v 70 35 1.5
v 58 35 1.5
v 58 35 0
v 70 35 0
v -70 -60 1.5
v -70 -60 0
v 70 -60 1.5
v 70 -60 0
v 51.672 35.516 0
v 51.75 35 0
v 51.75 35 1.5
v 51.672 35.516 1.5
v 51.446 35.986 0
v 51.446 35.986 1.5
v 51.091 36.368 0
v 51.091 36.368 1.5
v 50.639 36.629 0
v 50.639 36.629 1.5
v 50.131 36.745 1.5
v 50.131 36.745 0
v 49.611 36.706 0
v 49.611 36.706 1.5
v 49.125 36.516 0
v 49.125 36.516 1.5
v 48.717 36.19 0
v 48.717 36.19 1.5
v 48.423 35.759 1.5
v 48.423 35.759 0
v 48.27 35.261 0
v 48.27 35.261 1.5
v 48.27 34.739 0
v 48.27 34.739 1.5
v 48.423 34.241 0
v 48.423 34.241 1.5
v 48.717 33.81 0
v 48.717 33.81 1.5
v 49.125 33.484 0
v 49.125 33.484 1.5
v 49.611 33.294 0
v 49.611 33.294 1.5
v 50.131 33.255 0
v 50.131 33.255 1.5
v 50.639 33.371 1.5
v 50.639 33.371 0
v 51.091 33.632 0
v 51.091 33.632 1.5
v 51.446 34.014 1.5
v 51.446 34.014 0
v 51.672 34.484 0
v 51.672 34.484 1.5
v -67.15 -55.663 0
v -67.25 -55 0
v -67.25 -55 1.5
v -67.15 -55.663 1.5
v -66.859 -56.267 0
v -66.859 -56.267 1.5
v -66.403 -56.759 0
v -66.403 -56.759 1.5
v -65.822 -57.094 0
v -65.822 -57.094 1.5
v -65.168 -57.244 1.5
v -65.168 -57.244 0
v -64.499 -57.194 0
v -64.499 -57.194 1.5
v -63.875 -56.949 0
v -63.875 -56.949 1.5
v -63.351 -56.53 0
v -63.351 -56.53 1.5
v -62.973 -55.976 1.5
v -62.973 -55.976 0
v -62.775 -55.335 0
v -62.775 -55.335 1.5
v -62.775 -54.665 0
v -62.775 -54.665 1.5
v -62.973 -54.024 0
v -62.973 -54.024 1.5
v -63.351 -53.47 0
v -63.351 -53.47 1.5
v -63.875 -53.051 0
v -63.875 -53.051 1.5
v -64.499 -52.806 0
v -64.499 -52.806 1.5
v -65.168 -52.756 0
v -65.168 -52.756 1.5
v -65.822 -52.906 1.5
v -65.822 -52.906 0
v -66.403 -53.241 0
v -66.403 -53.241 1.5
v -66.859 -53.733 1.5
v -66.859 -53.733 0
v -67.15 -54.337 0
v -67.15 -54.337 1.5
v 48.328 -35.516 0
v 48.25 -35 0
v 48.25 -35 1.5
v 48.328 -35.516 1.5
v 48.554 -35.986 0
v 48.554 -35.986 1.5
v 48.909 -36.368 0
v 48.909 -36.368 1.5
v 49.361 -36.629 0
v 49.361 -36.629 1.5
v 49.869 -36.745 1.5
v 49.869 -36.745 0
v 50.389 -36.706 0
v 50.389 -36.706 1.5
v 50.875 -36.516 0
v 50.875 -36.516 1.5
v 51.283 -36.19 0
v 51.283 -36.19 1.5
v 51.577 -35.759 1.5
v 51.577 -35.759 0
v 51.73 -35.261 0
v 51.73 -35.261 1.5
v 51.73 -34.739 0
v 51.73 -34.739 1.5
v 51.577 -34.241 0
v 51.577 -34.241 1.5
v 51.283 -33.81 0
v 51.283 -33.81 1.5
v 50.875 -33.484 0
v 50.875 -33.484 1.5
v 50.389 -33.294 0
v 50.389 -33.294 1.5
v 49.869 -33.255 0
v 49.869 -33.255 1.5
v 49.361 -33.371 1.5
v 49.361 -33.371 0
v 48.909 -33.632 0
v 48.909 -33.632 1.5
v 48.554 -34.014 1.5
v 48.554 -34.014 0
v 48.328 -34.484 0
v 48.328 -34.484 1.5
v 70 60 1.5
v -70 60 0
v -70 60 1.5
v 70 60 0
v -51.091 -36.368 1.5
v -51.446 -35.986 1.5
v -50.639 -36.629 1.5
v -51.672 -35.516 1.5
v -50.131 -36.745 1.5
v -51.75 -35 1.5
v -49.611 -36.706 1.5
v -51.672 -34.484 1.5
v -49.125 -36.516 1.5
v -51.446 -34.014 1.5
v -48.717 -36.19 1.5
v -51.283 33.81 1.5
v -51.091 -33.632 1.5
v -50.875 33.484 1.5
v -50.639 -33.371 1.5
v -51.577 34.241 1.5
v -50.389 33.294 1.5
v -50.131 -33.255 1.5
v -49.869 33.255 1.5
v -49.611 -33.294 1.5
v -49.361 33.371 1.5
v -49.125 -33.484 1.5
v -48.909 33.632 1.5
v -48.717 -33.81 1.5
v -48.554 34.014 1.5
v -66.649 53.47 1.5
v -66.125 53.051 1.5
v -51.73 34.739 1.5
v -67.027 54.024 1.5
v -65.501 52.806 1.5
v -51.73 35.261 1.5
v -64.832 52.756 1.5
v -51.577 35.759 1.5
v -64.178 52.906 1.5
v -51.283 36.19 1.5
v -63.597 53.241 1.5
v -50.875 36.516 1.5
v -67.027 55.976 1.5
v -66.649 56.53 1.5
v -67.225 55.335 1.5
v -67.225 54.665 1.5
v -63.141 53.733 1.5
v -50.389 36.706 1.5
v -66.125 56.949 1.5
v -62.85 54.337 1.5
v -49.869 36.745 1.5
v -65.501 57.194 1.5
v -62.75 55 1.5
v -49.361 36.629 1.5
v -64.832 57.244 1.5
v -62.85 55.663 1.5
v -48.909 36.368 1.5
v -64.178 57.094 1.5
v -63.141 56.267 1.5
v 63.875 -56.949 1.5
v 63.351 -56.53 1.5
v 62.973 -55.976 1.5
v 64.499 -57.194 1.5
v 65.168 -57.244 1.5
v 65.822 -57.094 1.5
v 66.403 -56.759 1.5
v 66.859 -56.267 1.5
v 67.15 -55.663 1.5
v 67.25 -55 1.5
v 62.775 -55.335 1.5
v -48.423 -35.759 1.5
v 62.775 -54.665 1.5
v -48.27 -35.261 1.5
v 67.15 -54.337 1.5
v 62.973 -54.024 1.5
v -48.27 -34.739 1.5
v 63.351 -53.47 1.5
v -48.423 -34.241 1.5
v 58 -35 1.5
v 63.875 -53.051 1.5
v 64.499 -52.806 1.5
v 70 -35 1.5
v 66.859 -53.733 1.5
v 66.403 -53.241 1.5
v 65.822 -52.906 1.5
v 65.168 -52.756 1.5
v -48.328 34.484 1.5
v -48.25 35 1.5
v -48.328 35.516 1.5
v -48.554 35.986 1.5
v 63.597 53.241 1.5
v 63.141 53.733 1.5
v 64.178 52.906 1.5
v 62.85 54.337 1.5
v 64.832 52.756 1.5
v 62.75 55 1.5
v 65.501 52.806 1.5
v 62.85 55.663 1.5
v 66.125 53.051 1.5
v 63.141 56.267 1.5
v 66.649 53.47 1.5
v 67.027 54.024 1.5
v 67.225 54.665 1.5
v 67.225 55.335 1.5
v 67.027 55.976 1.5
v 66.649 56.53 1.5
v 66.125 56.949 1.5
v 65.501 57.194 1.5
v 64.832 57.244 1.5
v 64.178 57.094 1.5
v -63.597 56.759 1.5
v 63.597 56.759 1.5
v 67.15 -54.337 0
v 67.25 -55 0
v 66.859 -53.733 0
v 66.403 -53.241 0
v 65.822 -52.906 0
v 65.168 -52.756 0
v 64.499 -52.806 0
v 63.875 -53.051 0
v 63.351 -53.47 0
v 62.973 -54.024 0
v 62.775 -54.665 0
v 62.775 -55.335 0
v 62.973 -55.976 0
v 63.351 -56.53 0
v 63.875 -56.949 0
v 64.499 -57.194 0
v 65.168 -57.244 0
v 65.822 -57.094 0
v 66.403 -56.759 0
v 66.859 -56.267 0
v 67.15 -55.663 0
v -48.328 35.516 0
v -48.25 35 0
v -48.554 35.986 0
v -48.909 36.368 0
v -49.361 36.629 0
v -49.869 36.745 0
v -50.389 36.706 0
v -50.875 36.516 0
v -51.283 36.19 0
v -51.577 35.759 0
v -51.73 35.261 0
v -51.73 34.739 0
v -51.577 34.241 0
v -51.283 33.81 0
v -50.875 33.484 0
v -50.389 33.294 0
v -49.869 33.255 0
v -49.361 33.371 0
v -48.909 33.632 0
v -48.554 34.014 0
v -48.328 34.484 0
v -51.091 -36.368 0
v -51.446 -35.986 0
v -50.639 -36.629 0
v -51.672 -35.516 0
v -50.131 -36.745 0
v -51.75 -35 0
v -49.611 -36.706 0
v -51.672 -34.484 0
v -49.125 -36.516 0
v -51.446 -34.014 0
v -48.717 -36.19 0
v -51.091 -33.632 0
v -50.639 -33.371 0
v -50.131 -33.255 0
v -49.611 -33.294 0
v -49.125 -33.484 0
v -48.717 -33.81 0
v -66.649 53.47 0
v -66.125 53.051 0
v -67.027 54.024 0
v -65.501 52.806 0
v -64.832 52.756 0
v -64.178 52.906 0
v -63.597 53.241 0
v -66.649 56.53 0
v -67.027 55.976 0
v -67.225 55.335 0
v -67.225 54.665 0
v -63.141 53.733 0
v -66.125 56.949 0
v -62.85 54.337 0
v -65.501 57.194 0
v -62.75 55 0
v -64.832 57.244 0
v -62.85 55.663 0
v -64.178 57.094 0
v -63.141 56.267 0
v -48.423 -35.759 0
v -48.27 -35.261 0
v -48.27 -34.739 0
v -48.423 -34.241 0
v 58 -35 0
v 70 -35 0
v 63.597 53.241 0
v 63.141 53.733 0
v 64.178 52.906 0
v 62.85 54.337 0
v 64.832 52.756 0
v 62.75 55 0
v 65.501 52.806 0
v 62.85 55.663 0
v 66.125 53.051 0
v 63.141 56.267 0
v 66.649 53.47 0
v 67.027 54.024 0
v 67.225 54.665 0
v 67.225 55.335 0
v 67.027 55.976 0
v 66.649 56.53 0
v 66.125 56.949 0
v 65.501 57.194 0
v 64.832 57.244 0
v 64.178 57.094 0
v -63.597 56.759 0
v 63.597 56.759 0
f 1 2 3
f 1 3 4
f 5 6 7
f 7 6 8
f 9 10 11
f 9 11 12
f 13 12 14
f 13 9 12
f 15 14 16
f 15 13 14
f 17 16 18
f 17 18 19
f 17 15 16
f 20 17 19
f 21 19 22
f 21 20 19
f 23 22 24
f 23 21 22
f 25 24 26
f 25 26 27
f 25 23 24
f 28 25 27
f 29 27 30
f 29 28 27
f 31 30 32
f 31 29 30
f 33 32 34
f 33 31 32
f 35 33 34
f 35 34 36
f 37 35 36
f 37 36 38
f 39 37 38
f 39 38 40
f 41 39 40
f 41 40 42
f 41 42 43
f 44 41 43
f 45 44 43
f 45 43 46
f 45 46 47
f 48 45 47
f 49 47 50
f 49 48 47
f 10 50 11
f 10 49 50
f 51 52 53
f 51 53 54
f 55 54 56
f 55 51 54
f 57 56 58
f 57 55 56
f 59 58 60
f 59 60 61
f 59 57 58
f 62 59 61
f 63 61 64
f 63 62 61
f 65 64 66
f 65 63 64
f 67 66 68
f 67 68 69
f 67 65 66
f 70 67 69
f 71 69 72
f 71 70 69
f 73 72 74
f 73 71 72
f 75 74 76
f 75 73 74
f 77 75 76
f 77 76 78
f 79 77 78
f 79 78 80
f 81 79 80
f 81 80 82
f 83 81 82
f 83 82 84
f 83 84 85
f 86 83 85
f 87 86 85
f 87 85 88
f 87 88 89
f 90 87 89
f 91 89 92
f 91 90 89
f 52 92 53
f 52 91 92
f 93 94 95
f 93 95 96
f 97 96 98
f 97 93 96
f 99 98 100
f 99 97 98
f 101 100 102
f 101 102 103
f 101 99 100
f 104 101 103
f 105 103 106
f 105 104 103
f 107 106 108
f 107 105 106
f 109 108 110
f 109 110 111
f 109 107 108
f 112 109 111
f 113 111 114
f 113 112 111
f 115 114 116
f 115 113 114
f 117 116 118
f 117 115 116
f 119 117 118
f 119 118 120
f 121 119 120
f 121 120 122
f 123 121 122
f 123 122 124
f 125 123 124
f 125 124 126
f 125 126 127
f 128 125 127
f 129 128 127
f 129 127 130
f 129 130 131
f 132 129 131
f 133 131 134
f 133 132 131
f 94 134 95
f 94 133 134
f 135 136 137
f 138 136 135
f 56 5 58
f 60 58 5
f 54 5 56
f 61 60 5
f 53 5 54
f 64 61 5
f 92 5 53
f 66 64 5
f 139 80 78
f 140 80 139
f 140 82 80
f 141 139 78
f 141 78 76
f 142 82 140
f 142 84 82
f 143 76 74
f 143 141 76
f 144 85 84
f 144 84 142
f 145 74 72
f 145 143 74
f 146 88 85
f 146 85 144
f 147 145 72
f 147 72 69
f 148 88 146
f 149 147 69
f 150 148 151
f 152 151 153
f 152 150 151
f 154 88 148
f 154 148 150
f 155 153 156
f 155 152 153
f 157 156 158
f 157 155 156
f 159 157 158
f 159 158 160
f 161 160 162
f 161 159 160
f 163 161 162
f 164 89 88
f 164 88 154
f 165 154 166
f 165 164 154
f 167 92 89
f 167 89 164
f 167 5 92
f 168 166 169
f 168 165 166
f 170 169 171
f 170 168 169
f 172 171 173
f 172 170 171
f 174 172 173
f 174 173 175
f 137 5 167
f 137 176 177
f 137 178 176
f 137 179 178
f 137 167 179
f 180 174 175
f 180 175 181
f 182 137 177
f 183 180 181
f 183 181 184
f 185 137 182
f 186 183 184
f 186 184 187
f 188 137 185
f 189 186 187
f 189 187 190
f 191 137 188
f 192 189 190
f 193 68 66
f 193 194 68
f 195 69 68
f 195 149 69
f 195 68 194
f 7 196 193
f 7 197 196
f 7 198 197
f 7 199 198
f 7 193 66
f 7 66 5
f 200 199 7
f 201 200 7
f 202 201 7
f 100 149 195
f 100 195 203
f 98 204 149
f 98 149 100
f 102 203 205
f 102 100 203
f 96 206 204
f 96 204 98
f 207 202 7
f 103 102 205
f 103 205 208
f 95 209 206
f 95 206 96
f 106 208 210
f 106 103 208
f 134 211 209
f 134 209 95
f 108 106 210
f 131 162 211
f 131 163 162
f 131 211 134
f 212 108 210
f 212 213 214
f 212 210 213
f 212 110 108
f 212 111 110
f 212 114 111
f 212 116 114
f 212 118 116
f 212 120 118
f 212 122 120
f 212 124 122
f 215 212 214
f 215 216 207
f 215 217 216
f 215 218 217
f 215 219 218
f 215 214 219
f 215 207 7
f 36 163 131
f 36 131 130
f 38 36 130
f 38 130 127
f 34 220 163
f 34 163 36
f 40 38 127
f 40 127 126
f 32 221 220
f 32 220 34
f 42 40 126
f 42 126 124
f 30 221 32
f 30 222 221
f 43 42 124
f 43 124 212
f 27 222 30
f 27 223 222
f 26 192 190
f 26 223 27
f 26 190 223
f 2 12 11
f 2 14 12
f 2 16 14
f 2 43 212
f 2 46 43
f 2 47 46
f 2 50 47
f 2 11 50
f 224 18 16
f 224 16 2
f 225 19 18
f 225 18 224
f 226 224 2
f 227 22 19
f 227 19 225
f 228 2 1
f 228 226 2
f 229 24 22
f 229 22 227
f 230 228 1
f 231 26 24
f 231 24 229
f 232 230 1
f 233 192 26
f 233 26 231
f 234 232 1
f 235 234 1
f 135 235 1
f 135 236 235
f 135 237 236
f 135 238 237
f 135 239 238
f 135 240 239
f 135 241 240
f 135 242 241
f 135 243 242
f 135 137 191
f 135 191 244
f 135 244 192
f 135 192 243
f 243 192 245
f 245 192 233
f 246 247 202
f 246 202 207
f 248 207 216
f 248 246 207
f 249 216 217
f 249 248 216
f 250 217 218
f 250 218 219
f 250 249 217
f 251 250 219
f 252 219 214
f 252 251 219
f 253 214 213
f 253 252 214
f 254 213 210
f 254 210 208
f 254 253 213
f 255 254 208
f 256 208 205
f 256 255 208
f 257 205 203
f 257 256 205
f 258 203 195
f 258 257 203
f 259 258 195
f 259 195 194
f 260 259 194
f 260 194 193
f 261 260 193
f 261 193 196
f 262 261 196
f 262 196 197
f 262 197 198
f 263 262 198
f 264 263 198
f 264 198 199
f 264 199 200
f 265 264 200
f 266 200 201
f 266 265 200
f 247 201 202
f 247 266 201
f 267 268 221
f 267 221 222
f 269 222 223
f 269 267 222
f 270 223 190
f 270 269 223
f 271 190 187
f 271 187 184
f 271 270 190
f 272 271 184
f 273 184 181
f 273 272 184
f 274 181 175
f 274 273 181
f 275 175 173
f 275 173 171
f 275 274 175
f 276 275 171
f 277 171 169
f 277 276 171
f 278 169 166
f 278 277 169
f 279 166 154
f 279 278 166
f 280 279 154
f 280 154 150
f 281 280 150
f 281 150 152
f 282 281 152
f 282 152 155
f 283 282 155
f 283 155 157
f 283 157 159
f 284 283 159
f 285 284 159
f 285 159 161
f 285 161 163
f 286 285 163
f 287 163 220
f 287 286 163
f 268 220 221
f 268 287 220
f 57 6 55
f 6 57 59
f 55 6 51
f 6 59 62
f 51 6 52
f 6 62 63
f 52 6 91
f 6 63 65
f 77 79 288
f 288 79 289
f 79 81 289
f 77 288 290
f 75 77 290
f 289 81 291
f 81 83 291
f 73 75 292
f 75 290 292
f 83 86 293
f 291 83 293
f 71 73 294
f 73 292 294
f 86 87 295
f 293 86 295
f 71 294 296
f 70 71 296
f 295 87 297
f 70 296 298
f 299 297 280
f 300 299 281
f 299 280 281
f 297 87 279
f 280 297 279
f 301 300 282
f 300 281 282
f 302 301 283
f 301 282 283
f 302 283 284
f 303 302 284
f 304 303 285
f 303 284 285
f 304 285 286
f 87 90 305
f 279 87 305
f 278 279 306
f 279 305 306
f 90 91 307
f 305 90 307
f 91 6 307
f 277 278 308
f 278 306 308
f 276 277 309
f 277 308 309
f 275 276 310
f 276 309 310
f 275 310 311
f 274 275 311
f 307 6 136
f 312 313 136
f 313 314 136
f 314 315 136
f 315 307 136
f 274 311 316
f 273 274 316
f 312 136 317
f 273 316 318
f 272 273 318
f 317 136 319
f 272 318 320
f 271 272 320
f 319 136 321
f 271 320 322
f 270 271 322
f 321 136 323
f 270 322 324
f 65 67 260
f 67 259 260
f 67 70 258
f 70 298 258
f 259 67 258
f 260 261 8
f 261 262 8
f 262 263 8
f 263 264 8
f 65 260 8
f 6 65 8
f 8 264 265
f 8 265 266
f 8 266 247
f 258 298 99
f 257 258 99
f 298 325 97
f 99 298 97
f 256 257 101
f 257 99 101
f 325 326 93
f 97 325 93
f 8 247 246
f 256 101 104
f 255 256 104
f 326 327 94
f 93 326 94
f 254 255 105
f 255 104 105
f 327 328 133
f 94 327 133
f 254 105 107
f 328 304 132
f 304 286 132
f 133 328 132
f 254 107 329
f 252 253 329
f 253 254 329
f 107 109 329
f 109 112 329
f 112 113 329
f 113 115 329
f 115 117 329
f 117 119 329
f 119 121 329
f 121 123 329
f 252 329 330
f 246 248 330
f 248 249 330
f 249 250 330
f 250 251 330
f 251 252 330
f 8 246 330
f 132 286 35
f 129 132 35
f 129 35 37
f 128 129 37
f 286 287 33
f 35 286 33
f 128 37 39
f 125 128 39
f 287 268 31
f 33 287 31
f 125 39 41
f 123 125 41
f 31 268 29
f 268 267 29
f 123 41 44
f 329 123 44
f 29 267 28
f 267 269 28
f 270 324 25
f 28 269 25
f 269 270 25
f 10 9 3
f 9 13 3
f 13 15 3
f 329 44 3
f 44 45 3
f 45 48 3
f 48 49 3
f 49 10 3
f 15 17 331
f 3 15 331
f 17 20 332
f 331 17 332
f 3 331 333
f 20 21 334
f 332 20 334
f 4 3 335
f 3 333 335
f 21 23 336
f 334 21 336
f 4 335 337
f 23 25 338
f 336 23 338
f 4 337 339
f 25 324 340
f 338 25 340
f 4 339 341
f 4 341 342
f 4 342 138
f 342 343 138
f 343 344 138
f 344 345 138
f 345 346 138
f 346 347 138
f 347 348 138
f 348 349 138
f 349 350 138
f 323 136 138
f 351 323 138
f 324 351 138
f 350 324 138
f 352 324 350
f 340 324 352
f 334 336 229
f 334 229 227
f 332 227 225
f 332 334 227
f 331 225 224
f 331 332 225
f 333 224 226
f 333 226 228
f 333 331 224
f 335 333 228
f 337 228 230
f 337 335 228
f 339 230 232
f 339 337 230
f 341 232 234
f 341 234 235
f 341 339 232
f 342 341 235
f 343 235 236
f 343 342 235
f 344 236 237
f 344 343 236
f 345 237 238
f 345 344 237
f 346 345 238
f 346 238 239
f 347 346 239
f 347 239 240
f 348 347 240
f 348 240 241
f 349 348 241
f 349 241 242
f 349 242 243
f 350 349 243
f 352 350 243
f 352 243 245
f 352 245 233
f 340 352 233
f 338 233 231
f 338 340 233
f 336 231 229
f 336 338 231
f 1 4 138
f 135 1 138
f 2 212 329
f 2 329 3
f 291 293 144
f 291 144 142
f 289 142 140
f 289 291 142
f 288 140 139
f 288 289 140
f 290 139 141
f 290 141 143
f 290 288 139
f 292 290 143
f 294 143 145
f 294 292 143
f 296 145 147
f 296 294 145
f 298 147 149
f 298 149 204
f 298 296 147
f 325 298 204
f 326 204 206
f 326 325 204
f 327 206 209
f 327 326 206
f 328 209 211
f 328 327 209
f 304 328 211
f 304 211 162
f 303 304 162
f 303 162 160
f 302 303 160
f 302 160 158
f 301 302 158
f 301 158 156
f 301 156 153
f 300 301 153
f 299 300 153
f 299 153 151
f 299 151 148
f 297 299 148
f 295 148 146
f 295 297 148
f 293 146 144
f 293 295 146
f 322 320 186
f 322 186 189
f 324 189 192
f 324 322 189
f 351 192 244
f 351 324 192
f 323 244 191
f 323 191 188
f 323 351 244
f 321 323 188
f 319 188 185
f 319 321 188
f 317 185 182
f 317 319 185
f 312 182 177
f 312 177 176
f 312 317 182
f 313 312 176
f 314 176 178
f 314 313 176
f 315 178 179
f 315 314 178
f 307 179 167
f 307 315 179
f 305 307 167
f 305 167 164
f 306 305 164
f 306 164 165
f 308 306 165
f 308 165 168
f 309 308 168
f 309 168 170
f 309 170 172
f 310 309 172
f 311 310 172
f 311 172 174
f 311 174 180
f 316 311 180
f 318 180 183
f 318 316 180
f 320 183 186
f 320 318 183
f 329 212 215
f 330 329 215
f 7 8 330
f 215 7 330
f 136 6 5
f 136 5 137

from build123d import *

# Parameters (mm, degrees)
SKETCH_1_W          = 140
SKETCH_1_H          = 120
SKETCH_1_R          = 2.25
SKETCH_1_R_2        = 1.75
EXTRUDE_1_DEPTH     = 1.5
SKETCH_2_W          = 21.124168751
SKETCH_2_H          = 70
CUT_EXTRUDE_1_DEPTH = 10


with BuildPart() as part:
    # Эскиз1 → Вытянуть1 (new body)
    with BuildSketch(Plane.XY):
        Rectangle(SKETCH_1_W, SKETCH_1_H)
        with Locations((-65, 55)):
            Circle(SKETCH_1_R, mode=Mode.SUBTRACT)
        with Locations(Location((-65, -55, 0), (0, 0, 180))):
            Circle(SKETCH_1_R, mode=Mode.SUBTRACT)
        with Locations((65, -55)):
            Circle(SKETCH_1_R, mode=Mode.SUBTRACT)
        with Locations(Location((65, 55, 0), (0, 0, 180))):
            Circle(SKETCH_1_R, mode=Mode.SUBTRACT)
        with Locations((-50, 35)):
            Circle(SKETCH_1_R_2, mode=Mode.SUBTRACT)
        with Locations(Location((-50, -35, 0), (0, 0, 180))):
            Circle(SKETCH_1_R_2, mode=Mode.SUBTRACT)
        with Locations((50, 35)):
            Circle(SKETCH_1_R_2, mode=Mode.SUBTRACT)
        with Locations(Location((50, -35, 0), (0, 0, 180))):
            Circle(SKETCH_1_R_2, mode=Mode.SUBTRACT)
    extrude(amount=EXTRUDE_1_DEPTH)

    # Эскиз2 → Вырез-Вытянуть1 (cut)
    with BuildSketch(Plane.XY.offset(1.5)):
        with Locations((68.562084376, 0)):
            Rectangle(SKETCH_2_W, SKETCH_2_H)
    extrude(amount=-CUT_EXTRUDE_1_DEPTH, mode=Mode.SUBTRACT)


solid = part.part
